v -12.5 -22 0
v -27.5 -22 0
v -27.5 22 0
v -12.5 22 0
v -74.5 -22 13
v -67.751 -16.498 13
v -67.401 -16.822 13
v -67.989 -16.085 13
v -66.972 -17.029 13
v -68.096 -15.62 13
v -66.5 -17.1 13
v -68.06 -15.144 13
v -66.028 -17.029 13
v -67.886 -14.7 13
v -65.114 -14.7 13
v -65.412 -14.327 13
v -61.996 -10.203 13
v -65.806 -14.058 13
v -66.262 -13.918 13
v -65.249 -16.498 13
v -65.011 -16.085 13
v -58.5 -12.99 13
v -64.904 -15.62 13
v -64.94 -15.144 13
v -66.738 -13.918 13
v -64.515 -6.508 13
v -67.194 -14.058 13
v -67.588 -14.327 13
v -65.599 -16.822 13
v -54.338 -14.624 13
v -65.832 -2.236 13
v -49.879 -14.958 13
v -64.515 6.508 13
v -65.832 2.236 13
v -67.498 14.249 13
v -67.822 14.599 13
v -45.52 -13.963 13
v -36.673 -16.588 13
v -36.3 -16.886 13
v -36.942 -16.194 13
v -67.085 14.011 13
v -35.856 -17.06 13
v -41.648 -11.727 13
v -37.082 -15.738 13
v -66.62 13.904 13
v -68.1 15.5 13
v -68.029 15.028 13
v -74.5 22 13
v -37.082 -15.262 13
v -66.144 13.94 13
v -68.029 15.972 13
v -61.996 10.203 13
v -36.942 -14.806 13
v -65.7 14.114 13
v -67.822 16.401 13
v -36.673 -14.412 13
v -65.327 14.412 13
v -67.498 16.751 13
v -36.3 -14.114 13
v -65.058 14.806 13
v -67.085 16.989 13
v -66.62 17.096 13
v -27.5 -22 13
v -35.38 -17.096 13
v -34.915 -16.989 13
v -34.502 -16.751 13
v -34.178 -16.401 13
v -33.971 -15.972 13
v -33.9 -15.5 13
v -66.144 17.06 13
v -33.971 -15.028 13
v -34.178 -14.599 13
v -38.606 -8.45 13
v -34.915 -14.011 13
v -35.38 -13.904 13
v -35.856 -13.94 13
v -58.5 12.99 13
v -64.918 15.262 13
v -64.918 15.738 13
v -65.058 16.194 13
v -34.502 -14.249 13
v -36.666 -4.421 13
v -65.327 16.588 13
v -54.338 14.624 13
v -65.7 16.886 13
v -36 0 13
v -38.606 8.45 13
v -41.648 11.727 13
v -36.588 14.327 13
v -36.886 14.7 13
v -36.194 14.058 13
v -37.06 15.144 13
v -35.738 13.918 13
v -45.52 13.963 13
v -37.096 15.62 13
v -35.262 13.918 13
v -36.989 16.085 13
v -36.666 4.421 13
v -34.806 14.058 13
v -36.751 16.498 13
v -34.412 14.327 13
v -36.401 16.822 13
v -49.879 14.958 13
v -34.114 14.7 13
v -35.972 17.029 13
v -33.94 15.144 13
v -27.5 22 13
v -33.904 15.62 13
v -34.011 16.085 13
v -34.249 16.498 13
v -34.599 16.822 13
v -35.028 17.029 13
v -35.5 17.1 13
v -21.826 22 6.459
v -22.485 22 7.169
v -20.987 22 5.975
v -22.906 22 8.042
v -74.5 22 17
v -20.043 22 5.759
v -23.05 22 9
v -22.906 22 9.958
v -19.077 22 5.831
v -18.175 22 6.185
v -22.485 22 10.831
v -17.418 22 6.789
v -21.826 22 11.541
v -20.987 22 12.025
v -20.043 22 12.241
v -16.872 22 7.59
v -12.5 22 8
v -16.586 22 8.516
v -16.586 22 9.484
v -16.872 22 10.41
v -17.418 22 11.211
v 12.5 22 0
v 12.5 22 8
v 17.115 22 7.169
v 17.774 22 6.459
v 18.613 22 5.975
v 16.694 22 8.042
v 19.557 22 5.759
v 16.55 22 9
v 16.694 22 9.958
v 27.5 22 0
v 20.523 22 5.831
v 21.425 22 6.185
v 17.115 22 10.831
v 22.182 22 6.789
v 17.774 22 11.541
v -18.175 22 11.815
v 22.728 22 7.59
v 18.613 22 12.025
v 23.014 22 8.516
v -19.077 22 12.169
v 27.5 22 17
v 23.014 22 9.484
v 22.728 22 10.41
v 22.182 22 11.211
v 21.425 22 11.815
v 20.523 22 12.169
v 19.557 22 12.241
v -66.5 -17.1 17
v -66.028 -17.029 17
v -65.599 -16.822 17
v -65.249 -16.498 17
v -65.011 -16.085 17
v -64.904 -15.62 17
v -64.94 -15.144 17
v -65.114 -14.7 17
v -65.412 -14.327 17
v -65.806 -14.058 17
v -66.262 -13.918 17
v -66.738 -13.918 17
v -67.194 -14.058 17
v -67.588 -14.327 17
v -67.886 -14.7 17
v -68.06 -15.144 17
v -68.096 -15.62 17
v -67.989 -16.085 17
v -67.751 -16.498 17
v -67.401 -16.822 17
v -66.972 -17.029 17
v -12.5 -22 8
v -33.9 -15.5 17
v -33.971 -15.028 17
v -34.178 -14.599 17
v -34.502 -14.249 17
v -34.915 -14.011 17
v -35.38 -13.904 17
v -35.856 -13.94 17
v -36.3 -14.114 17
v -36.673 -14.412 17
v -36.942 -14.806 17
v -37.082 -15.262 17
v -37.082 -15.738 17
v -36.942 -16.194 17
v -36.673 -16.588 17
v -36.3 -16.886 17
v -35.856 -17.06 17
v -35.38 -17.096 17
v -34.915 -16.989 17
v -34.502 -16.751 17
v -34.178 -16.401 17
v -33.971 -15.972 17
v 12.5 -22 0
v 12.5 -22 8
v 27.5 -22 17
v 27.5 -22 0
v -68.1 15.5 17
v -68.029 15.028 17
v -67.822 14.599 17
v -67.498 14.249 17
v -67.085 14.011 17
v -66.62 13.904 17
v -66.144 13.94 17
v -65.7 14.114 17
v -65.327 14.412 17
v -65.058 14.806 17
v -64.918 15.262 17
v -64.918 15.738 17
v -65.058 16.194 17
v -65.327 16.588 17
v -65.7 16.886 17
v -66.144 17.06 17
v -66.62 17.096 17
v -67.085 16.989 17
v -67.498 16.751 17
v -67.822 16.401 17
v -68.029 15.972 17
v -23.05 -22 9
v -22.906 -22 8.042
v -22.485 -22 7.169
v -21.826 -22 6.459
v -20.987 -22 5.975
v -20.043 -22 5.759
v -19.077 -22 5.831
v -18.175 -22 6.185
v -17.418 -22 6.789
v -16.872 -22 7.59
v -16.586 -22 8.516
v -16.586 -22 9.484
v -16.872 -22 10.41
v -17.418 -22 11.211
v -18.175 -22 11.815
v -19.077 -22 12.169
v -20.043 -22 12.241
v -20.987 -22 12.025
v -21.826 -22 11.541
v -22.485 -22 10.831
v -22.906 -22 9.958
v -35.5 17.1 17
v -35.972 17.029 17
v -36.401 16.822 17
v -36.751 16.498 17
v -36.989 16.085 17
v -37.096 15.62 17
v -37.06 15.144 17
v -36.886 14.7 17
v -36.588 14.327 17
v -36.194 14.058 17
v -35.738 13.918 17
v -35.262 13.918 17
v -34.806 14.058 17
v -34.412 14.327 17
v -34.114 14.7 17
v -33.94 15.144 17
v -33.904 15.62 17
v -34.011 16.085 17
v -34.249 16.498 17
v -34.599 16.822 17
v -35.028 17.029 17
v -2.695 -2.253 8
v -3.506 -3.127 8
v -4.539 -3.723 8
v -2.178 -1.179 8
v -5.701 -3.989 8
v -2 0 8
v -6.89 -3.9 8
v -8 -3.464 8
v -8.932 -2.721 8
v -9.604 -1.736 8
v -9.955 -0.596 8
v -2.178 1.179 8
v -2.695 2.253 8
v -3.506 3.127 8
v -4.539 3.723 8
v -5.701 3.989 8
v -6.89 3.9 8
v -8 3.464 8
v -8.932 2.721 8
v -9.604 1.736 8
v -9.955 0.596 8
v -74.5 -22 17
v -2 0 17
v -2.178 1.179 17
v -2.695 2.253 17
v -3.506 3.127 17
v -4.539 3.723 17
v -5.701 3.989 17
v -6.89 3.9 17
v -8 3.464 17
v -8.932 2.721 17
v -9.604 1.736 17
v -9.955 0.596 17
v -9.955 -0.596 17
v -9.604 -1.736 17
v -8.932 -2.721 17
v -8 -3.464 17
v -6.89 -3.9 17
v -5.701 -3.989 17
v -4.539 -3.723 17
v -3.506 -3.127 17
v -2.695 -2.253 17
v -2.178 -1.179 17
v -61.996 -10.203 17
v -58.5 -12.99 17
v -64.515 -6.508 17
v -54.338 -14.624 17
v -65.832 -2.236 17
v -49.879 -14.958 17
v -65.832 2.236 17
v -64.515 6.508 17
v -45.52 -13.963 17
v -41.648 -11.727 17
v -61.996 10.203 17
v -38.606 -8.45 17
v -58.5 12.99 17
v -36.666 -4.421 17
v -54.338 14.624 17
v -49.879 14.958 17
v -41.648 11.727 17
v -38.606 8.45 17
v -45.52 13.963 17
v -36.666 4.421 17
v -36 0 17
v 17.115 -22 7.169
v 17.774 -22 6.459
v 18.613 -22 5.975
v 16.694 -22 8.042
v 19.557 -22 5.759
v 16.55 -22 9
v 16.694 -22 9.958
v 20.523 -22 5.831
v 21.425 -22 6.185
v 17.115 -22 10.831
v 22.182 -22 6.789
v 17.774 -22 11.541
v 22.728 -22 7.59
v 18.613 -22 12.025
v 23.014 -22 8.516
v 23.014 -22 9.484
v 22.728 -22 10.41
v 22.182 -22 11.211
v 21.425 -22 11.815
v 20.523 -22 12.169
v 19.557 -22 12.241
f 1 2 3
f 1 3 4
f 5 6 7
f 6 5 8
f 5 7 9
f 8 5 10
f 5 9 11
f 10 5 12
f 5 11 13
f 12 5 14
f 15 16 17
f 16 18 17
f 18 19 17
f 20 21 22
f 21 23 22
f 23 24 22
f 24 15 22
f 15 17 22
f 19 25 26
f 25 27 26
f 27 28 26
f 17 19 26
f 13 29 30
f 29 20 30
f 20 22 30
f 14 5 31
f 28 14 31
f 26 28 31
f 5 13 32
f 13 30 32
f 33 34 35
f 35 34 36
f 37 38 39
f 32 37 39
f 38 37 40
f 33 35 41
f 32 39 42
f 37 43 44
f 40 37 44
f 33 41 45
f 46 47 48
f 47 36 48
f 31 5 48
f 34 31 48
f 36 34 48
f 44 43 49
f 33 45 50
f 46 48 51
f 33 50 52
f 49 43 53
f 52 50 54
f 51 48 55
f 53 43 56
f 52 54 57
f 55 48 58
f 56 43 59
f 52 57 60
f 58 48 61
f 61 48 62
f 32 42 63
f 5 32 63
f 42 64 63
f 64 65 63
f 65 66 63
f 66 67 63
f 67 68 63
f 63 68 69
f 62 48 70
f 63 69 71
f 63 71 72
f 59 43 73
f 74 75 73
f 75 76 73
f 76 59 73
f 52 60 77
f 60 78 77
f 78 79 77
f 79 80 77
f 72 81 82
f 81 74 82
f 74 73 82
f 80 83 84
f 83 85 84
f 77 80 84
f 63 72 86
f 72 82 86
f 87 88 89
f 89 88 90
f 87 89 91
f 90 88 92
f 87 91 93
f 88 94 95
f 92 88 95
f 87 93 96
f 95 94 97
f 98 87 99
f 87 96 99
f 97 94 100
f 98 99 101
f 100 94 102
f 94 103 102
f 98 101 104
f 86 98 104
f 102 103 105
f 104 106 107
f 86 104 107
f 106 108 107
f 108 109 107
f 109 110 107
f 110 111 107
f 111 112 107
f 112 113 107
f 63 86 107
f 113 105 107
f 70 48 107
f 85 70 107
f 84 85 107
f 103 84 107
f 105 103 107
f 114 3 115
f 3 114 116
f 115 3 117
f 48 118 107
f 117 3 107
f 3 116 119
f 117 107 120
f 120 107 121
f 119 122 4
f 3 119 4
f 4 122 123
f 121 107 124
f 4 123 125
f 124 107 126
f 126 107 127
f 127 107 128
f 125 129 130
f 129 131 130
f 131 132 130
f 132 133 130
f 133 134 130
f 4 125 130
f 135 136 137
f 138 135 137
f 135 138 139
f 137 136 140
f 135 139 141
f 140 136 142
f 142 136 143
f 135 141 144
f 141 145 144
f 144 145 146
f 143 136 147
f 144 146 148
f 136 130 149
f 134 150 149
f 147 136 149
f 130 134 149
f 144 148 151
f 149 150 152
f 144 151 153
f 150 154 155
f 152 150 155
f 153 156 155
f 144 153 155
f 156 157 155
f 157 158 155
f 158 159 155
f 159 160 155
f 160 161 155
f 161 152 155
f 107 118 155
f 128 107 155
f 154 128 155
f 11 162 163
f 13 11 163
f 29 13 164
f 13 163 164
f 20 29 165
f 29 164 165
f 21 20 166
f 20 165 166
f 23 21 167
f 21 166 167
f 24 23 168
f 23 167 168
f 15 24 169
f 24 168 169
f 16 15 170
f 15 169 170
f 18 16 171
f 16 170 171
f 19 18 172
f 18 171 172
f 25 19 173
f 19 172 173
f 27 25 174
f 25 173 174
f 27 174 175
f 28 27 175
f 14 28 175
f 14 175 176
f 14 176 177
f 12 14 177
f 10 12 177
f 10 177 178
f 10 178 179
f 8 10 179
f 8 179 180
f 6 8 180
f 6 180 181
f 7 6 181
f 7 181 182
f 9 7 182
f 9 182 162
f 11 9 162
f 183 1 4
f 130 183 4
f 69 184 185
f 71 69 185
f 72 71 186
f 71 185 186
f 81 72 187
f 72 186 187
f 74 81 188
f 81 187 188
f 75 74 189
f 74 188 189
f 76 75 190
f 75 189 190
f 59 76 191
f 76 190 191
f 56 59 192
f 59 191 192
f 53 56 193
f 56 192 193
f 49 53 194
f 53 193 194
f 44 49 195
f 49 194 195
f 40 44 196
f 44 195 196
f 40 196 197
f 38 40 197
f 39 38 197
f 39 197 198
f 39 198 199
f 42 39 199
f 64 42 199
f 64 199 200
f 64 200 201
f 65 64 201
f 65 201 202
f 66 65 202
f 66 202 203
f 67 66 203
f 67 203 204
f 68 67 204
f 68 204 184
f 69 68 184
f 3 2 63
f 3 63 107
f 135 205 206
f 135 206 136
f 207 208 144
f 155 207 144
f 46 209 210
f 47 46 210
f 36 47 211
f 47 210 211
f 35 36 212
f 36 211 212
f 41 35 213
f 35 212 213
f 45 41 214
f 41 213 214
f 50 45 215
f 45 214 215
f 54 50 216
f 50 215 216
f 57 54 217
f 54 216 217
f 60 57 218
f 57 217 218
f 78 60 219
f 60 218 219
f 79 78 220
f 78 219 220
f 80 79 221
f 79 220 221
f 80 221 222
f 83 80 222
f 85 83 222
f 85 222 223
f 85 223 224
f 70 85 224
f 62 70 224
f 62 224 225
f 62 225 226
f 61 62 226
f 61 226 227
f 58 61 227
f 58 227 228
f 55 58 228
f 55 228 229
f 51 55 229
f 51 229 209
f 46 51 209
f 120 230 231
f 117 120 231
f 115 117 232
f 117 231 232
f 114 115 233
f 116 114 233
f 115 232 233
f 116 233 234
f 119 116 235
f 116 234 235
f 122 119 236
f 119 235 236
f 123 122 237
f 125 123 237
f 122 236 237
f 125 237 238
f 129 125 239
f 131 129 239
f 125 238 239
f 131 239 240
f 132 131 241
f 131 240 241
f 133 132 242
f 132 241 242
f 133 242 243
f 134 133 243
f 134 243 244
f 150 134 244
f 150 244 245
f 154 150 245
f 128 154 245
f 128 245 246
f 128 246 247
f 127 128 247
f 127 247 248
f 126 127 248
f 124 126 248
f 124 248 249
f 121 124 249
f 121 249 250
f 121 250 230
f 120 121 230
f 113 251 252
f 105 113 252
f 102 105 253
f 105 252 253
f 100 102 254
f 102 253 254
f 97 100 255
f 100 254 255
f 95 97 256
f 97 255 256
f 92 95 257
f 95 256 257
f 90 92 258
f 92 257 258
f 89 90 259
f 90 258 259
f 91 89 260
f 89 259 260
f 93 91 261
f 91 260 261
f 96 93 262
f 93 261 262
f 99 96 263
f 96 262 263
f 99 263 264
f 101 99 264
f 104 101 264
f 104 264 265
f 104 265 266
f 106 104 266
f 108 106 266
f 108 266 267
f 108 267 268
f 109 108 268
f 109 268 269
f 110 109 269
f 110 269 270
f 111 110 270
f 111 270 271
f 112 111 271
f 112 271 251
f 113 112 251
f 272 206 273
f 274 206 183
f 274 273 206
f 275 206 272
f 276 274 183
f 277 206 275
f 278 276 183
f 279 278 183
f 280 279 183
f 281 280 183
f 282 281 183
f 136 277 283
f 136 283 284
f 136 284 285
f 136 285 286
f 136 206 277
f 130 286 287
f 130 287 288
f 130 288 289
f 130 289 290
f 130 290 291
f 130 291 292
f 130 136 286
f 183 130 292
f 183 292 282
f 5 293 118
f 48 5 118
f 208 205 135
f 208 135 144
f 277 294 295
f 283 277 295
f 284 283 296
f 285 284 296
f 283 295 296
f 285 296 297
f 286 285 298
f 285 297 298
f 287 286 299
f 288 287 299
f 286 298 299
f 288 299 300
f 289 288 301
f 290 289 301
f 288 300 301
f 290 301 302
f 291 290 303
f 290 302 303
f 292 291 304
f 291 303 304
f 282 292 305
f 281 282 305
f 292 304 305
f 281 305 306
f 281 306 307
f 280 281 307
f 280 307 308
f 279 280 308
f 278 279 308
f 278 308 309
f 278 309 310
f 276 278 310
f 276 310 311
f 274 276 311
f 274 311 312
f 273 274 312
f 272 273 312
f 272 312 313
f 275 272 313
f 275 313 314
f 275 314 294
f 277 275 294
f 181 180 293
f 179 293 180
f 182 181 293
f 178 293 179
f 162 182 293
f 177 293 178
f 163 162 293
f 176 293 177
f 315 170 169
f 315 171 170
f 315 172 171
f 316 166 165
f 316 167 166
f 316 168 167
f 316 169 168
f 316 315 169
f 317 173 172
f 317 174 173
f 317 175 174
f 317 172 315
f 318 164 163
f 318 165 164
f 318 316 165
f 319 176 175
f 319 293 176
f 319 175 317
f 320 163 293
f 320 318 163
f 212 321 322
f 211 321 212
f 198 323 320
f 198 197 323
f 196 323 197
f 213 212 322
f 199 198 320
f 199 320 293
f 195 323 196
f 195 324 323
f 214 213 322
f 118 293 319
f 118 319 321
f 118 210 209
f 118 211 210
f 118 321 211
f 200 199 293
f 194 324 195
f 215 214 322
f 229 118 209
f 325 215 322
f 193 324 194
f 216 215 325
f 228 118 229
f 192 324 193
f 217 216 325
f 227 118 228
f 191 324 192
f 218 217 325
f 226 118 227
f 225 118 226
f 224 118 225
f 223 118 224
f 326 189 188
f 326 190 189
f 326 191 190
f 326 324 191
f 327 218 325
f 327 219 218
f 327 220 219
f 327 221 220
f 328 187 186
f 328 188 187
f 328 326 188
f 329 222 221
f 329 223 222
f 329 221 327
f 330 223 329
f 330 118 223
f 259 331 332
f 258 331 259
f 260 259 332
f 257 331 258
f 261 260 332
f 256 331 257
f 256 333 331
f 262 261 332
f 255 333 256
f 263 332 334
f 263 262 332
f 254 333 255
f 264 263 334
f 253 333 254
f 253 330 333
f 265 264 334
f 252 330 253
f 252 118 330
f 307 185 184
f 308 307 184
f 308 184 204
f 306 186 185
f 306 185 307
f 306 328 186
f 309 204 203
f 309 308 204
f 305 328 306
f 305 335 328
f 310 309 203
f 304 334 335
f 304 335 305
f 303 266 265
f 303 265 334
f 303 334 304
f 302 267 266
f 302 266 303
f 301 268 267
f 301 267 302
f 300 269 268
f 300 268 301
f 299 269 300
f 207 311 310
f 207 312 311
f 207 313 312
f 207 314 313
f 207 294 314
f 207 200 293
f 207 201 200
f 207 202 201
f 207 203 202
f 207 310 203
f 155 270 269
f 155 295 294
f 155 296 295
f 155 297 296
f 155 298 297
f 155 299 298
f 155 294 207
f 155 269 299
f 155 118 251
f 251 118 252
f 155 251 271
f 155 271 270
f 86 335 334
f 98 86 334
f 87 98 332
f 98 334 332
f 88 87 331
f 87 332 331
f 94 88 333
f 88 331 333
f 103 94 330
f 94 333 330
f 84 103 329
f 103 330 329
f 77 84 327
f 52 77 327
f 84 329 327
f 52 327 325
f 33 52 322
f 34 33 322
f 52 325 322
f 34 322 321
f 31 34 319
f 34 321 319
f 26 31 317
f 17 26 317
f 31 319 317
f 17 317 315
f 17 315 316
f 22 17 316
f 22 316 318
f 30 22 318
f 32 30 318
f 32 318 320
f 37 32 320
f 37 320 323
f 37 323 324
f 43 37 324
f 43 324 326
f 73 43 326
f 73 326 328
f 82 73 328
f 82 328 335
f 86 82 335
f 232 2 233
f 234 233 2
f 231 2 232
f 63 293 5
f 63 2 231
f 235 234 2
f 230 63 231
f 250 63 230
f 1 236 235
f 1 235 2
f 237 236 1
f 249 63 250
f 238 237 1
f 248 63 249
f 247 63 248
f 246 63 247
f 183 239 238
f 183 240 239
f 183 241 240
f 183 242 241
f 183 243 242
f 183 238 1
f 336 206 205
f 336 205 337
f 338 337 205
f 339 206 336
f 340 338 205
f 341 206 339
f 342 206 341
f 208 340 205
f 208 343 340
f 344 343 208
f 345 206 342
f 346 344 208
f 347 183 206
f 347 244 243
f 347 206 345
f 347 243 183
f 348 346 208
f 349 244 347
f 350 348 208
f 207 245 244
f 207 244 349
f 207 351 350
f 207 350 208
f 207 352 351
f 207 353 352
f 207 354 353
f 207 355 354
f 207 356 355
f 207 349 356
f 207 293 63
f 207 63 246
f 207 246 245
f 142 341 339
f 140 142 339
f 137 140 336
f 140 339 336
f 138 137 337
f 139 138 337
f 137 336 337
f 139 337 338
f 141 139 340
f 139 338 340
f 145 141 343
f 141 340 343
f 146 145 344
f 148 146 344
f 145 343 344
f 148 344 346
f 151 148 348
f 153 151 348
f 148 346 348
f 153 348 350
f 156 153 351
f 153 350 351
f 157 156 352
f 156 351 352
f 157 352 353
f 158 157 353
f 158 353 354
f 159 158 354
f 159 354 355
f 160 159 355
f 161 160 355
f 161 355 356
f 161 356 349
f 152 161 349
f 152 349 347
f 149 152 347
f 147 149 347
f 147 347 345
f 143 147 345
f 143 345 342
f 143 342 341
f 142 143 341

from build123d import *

# Parameters (mm, degrees)
SKETCH_1_W               = 55
SKETCH_1_H               = 44
EXTRUDE_1_DEPTH          = 18
SKETCH_2_R               = 4
CUT_EXTRUDE_1_DEPTH      = 18
HOLE_WIZARD_6_5_6_5_1_D  = 6.5
SKETCH_5_W               = 25
SKETCH_5_H               = 50
CUT_EXTRUDE_2_DEPTH      = 8
SKETCH_6_W               = 47
SKETCH_6_H               = 44
SKETCH_6_R               = 15
EXTRUDE_2_DEPTH          = 5
HOLE_WIZARD_3_2_3_2_1_D  = 3.2
PATTERN_CIRCULAR_1_COUNT = 4
SKETCH_9_W               = 200
SKETCH_9_H               = 100
CUT_EXTRUDE_3_DEPTH      = 1


with BuildPart() as part:
    # Эскиз1 → Бобышка-Вытянуть1 (new body)
    with BuildSketch(Plane.XY):
        Rectangle(SKETCH_1_W, SKETCH_1_H)
    extrude(amount=EXTRUDE_1_DEPTH)

    # Эскиз2 → Вырез-Вытянуть1 (cut)
    with BuildSketch(Plane.XY.offset(18)):
        with Locations((-6, 0)):
            Circle(SKETCH_2_R)
    extrude(amount=-CUT_EXTRUDE_1_DEPTH, mode=Mode.SUBTRACT)

    # Диаметр отверстия Ø6.5 (6.5)1 (through all)
    with Locations(Plane(origin=(0, 22, 0), x_dir=(1, 0, 0), z_dir=(0, 1, 0))):
        with Locations((19.8, -9), (-19.8, -9)):
            Hole(HOLE_WIZARD_6_5_6_5_1_D / 2)

    # Эскиз5 → Вырез-Вытянуть2 (cut)
    with BuildSketch(Plane(origin=(0, 0, 0), x_dir=(-1, 0, 0), z_dir=(0, 0, -1))):
        Rectangle(SKETCH_5_W, SKETCH_5_H)
    extrude(amount=-CUT_EXTRUDE_2_DEPTH, mode=Mode.SUBTRACT)

    # Эскиз6 → Бобышка-Вытянуть2 (add)
    with BuildSketch(Plane.XY.offset(18)):
        with Locations((-51, 0)):
            Rectangle(SKETCH_6_W, SKETCH_6_H)
        with Locations((-51, 0)):
            Circle(SKETCH_6_R, mode=Mode.SUBTRACT)
    extrude(amount=-EXTRUDE_2_DEPTH)

    # Диаметр отверстия Ø3.2 (3.2)1 (through all)
    with Locations(Plane(origin=(0, 0, 13), x_dir=(-1, 0, 0), z_dir=(0, 0, -1))):
        with Locations((35.5, -15.5)):
            hole_wizard_3_2_3_2_1 = Hole(HOLE_WIZARD_3_2_3_2_1_D / 2)

    # Круговой массив1: Диаметр отверстия Ø3.2 (3.2)1 ×4 about axis
    pattern_circular_1_axis = Axis((-51, 0, 0), (0, 0, 1))
    for i in range(1, PATTERN_CIRCULAR_1_COUNT):
        add(hole_wizard_3_2_3_2_1.rotate(pattern_circular_1_axis, i * 360 / PATTERN_CIRCULAR_1_COUNT), mode=Mode.SUBTRACT)

    # Эскиз9 → Вырез-Вытянуть3 (cut)
    with BuildSketch(Plane.XY.offset(18)):
        Rectangle(SKETCH_9_W, SKETCH_9_H)
    extrude(amount=-CUT_EXTRUDE_3_DEPTH, mode=Mode.SUBTRACT)


solid = part.part
